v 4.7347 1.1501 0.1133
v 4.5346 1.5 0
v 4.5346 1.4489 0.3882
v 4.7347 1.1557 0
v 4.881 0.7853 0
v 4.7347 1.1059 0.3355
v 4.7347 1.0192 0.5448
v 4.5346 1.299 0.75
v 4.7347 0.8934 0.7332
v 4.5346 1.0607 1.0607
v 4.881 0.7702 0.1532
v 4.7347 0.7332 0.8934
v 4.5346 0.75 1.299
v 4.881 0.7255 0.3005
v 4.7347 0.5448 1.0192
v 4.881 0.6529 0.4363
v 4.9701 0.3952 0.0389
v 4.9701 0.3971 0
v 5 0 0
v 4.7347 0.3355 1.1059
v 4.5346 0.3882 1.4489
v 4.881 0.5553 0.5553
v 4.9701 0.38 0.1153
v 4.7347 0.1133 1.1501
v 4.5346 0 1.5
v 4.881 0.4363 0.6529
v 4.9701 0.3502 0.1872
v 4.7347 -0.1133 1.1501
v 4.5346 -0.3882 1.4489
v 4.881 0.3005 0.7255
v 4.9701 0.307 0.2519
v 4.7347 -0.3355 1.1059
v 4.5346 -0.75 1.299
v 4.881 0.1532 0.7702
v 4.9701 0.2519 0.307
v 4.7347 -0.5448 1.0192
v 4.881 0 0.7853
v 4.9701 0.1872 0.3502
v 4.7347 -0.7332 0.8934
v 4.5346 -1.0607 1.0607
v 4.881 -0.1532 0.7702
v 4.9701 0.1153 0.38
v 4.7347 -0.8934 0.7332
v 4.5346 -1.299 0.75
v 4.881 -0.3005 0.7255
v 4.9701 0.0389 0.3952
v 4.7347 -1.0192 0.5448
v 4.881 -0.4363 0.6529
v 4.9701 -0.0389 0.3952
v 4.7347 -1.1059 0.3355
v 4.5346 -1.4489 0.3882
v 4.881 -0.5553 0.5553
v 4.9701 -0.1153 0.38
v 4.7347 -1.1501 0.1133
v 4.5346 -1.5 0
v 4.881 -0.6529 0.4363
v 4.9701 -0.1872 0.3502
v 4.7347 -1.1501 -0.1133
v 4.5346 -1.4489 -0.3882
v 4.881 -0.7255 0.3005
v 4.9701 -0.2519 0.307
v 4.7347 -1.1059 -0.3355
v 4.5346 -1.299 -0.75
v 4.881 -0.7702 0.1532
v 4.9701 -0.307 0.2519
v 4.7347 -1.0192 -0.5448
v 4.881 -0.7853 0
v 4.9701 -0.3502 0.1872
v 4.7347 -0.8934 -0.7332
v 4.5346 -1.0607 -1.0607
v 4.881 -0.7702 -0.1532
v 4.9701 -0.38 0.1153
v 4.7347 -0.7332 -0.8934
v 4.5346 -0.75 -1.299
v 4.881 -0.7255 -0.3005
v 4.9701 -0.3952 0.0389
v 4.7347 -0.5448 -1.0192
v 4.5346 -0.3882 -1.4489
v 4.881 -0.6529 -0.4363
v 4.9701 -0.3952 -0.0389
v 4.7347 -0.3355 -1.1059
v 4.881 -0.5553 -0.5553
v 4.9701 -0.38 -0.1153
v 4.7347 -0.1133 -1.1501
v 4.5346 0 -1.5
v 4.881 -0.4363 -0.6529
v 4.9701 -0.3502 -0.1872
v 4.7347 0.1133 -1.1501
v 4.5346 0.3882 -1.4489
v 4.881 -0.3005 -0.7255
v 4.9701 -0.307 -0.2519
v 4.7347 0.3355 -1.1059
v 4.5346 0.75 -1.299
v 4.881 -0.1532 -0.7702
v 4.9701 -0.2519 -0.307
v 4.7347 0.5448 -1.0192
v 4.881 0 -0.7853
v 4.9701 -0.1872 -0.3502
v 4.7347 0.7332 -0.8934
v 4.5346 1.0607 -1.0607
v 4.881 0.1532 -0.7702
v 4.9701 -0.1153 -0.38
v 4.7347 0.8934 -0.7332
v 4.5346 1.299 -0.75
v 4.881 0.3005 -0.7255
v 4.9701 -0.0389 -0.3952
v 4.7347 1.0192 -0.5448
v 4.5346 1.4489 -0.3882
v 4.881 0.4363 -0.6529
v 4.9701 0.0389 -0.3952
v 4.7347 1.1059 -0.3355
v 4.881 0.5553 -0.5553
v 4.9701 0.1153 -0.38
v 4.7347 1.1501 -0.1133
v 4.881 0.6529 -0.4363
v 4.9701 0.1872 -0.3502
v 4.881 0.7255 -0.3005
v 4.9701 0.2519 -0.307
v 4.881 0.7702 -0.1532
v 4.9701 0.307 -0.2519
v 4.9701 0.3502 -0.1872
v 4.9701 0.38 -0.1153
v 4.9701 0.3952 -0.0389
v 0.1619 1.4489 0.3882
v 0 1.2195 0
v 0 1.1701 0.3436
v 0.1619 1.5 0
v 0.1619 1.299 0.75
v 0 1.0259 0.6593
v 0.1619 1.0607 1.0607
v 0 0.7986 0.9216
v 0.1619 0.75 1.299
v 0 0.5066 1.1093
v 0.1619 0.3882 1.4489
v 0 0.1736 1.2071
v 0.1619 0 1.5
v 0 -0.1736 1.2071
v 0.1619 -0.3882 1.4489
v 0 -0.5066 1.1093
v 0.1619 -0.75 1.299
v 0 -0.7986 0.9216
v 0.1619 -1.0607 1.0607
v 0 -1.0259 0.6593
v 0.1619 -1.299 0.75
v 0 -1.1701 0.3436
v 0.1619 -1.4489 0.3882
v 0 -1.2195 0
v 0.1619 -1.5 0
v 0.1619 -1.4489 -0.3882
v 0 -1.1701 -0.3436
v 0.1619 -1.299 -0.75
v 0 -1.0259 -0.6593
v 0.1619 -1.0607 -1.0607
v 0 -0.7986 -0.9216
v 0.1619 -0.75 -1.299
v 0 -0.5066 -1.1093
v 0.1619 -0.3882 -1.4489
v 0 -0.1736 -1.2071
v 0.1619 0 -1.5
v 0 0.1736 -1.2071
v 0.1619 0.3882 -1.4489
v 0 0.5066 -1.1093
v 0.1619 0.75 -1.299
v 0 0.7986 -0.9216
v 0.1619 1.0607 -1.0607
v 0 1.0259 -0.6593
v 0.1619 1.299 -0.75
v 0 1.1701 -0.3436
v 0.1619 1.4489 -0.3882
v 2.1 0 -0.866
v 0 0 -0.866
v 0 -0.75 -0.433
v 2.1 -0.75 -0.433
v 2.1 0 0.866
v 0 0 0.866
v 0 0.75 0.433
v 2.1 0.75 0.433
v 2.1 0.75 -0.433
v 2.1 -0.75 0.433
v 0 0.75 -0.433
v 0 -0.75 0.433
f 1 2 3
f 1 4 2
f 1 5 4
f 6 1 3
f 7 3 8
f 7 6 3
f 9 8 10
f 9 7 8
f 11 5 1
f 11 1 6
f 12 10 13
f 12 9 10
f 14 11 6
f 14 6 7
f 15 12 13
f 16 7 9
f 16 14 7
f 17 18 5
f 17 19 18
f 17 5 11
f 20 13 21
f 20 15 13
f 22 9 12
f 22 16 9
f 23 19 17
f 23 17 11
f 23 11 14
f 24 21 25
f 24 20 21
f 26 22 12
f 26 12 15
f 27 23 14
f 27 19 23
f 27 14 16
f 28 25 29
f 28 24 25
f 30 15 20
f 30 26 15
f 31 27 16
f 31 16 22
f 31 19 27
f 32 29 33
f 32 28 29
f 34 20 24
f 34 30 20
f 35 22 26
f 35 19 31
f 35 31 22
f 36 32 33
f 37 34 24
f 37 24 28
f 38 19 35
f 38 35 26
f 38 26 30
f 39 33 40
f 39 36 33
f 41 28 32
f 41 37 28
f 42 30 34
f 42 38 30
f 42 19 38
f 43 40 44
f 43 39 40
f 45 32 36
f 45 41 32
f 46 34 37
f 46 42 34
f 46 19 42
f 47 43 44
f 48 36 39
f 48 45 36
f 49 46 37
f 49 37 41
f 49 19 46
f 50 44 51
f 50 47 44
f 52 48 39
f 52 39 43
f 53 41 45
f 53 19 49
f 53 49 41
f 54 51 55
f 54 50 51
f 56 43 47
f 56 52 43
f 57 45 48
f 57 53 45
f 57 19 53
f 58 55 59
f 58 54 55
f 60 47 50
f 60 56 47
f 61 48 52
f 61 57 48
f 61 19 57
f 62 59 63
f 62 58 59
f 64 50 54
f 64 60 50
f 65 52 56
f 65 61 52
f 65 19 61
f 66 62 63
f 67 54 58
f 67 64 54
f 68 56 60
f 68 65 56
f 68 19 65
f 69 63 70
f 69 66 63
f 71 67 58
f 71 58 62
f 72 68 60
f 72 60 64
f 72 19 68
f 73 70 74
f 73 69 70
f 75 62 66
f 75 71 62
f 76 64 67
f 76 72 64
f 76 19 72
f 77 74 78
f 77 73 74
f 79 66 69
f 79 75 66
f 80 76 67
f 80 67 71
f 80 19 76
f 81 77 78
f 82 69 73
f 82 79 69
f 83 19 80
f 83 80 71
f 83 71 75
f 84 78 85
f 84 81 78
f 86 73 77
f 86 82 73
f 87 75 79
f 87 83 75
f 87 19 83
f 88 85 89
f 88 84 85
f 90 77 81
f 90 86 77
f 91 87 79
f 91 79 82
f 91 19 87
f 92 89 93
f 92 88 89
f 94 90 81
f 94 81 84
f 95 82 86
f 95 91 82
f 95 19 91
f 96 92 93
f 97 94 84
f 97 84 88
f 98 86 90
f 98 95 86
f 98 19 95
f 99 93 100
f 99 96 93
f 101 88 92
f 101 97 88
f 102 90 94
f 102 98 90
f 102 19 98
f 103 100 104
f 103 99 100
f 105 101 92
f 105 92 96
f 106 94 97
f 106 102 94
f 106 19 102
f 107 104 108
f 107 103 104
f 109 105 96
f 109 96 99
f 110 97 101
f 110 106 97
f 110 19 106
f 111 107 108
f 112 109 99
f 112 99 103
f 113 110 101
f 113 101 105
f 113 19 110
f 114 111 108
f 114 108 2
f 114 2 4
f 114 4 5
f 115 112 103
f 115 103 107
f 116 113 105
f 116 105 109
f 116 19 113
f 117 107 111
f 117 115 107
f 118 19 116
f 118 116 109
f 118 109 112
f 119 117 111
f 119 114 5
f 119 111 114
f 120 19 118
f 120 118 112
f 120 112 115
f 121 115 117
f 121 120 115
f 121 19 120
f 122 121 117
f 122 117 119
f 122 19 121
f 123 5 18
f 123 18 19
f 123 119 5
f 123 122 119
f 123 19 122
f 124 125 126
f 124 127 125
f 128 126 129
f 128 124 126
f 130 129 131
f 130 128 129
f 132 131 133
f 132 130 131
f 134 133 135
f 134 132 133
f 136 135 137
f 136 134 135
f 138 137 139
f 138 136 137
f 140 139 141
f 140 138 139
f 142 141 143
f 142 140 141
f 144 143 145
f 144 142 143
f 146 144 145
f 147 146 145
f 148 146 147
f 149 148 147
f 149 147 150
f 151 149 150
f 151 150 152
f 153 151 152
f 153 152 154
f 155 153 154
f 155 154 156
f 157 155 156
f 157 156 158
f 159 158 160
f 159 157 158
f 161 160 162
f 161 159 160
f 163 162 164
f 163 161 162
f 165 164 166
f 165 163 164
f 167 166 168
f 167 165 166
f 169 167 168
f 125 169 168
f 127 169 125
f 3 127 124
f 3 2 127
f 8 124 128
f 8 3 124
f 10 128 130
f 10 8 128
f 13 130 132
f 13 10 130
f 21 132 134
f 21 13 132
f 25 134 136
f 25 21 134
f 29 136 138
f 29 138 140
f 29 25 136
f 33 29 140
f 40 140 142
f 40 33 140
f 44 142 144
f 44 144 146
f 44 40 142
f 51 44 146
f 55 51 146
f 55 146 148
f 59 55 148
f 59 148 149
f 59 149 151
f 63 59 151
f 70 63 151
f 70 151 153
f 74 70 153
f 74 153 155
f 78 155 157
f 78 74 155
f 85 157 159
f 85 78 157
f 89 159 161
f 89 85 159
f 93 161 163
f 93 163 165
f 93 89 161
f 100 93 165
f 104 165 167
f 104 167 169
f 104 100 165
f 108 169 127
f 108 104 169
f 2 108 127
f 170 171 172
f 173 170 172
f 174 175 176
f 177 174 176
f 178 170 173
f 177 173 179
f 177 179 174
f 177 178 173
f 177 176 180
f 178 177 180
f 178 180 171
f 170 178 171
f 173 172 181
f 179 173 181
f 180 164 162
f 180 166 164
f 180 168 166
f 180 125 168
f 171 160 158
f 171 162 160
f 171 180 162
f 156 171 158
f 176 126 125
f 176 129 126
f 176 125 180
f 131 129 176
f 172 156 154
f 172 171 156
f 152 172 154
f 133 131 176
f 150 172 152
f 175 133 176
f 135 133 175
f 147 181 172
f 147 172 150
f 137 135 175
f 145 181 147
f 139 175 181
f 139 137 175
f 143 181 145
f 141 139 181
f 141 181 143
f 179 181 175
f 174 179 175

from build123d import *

# Parameters (mm, degrees)
HEX_2_DEPTH = 2.1


with BuildPart() as part:
    # BodySke → BaseBody (revolve)
    with BuildSketch(Plane.XY):
        with BuildLine():
            Line((0, 0), (0, 1.2195))
            Line((0, 1.2195), (0.161946751, 1.5))
            Line((0.161946751, 1.5), (4.534605227, 1.5))
            ThreePointArc((4.534605227, 1.5), (4.880978452, 0.785269427), (5, 0))
            Line((5, 0), (0, 0))
        make_face()
    revolve(axis=Axis((-12.7, 0, 0), (1, 0, 0)))

    # Sketch2 → Hex 2 (cut)
    with BuildSketch(Plane.ZY):
        Polygon((0.433012702, 0.75), (-0.433012702, 0.75), (-0.866025404, 0), (-0.433012702, -0.75), (0.433012702, -0.75), (0.866025404, 0), align=None)
    extrude(amount=-HEX_2_DEPTH, mode=Mode.SUBTRACT)


solid = part.part
